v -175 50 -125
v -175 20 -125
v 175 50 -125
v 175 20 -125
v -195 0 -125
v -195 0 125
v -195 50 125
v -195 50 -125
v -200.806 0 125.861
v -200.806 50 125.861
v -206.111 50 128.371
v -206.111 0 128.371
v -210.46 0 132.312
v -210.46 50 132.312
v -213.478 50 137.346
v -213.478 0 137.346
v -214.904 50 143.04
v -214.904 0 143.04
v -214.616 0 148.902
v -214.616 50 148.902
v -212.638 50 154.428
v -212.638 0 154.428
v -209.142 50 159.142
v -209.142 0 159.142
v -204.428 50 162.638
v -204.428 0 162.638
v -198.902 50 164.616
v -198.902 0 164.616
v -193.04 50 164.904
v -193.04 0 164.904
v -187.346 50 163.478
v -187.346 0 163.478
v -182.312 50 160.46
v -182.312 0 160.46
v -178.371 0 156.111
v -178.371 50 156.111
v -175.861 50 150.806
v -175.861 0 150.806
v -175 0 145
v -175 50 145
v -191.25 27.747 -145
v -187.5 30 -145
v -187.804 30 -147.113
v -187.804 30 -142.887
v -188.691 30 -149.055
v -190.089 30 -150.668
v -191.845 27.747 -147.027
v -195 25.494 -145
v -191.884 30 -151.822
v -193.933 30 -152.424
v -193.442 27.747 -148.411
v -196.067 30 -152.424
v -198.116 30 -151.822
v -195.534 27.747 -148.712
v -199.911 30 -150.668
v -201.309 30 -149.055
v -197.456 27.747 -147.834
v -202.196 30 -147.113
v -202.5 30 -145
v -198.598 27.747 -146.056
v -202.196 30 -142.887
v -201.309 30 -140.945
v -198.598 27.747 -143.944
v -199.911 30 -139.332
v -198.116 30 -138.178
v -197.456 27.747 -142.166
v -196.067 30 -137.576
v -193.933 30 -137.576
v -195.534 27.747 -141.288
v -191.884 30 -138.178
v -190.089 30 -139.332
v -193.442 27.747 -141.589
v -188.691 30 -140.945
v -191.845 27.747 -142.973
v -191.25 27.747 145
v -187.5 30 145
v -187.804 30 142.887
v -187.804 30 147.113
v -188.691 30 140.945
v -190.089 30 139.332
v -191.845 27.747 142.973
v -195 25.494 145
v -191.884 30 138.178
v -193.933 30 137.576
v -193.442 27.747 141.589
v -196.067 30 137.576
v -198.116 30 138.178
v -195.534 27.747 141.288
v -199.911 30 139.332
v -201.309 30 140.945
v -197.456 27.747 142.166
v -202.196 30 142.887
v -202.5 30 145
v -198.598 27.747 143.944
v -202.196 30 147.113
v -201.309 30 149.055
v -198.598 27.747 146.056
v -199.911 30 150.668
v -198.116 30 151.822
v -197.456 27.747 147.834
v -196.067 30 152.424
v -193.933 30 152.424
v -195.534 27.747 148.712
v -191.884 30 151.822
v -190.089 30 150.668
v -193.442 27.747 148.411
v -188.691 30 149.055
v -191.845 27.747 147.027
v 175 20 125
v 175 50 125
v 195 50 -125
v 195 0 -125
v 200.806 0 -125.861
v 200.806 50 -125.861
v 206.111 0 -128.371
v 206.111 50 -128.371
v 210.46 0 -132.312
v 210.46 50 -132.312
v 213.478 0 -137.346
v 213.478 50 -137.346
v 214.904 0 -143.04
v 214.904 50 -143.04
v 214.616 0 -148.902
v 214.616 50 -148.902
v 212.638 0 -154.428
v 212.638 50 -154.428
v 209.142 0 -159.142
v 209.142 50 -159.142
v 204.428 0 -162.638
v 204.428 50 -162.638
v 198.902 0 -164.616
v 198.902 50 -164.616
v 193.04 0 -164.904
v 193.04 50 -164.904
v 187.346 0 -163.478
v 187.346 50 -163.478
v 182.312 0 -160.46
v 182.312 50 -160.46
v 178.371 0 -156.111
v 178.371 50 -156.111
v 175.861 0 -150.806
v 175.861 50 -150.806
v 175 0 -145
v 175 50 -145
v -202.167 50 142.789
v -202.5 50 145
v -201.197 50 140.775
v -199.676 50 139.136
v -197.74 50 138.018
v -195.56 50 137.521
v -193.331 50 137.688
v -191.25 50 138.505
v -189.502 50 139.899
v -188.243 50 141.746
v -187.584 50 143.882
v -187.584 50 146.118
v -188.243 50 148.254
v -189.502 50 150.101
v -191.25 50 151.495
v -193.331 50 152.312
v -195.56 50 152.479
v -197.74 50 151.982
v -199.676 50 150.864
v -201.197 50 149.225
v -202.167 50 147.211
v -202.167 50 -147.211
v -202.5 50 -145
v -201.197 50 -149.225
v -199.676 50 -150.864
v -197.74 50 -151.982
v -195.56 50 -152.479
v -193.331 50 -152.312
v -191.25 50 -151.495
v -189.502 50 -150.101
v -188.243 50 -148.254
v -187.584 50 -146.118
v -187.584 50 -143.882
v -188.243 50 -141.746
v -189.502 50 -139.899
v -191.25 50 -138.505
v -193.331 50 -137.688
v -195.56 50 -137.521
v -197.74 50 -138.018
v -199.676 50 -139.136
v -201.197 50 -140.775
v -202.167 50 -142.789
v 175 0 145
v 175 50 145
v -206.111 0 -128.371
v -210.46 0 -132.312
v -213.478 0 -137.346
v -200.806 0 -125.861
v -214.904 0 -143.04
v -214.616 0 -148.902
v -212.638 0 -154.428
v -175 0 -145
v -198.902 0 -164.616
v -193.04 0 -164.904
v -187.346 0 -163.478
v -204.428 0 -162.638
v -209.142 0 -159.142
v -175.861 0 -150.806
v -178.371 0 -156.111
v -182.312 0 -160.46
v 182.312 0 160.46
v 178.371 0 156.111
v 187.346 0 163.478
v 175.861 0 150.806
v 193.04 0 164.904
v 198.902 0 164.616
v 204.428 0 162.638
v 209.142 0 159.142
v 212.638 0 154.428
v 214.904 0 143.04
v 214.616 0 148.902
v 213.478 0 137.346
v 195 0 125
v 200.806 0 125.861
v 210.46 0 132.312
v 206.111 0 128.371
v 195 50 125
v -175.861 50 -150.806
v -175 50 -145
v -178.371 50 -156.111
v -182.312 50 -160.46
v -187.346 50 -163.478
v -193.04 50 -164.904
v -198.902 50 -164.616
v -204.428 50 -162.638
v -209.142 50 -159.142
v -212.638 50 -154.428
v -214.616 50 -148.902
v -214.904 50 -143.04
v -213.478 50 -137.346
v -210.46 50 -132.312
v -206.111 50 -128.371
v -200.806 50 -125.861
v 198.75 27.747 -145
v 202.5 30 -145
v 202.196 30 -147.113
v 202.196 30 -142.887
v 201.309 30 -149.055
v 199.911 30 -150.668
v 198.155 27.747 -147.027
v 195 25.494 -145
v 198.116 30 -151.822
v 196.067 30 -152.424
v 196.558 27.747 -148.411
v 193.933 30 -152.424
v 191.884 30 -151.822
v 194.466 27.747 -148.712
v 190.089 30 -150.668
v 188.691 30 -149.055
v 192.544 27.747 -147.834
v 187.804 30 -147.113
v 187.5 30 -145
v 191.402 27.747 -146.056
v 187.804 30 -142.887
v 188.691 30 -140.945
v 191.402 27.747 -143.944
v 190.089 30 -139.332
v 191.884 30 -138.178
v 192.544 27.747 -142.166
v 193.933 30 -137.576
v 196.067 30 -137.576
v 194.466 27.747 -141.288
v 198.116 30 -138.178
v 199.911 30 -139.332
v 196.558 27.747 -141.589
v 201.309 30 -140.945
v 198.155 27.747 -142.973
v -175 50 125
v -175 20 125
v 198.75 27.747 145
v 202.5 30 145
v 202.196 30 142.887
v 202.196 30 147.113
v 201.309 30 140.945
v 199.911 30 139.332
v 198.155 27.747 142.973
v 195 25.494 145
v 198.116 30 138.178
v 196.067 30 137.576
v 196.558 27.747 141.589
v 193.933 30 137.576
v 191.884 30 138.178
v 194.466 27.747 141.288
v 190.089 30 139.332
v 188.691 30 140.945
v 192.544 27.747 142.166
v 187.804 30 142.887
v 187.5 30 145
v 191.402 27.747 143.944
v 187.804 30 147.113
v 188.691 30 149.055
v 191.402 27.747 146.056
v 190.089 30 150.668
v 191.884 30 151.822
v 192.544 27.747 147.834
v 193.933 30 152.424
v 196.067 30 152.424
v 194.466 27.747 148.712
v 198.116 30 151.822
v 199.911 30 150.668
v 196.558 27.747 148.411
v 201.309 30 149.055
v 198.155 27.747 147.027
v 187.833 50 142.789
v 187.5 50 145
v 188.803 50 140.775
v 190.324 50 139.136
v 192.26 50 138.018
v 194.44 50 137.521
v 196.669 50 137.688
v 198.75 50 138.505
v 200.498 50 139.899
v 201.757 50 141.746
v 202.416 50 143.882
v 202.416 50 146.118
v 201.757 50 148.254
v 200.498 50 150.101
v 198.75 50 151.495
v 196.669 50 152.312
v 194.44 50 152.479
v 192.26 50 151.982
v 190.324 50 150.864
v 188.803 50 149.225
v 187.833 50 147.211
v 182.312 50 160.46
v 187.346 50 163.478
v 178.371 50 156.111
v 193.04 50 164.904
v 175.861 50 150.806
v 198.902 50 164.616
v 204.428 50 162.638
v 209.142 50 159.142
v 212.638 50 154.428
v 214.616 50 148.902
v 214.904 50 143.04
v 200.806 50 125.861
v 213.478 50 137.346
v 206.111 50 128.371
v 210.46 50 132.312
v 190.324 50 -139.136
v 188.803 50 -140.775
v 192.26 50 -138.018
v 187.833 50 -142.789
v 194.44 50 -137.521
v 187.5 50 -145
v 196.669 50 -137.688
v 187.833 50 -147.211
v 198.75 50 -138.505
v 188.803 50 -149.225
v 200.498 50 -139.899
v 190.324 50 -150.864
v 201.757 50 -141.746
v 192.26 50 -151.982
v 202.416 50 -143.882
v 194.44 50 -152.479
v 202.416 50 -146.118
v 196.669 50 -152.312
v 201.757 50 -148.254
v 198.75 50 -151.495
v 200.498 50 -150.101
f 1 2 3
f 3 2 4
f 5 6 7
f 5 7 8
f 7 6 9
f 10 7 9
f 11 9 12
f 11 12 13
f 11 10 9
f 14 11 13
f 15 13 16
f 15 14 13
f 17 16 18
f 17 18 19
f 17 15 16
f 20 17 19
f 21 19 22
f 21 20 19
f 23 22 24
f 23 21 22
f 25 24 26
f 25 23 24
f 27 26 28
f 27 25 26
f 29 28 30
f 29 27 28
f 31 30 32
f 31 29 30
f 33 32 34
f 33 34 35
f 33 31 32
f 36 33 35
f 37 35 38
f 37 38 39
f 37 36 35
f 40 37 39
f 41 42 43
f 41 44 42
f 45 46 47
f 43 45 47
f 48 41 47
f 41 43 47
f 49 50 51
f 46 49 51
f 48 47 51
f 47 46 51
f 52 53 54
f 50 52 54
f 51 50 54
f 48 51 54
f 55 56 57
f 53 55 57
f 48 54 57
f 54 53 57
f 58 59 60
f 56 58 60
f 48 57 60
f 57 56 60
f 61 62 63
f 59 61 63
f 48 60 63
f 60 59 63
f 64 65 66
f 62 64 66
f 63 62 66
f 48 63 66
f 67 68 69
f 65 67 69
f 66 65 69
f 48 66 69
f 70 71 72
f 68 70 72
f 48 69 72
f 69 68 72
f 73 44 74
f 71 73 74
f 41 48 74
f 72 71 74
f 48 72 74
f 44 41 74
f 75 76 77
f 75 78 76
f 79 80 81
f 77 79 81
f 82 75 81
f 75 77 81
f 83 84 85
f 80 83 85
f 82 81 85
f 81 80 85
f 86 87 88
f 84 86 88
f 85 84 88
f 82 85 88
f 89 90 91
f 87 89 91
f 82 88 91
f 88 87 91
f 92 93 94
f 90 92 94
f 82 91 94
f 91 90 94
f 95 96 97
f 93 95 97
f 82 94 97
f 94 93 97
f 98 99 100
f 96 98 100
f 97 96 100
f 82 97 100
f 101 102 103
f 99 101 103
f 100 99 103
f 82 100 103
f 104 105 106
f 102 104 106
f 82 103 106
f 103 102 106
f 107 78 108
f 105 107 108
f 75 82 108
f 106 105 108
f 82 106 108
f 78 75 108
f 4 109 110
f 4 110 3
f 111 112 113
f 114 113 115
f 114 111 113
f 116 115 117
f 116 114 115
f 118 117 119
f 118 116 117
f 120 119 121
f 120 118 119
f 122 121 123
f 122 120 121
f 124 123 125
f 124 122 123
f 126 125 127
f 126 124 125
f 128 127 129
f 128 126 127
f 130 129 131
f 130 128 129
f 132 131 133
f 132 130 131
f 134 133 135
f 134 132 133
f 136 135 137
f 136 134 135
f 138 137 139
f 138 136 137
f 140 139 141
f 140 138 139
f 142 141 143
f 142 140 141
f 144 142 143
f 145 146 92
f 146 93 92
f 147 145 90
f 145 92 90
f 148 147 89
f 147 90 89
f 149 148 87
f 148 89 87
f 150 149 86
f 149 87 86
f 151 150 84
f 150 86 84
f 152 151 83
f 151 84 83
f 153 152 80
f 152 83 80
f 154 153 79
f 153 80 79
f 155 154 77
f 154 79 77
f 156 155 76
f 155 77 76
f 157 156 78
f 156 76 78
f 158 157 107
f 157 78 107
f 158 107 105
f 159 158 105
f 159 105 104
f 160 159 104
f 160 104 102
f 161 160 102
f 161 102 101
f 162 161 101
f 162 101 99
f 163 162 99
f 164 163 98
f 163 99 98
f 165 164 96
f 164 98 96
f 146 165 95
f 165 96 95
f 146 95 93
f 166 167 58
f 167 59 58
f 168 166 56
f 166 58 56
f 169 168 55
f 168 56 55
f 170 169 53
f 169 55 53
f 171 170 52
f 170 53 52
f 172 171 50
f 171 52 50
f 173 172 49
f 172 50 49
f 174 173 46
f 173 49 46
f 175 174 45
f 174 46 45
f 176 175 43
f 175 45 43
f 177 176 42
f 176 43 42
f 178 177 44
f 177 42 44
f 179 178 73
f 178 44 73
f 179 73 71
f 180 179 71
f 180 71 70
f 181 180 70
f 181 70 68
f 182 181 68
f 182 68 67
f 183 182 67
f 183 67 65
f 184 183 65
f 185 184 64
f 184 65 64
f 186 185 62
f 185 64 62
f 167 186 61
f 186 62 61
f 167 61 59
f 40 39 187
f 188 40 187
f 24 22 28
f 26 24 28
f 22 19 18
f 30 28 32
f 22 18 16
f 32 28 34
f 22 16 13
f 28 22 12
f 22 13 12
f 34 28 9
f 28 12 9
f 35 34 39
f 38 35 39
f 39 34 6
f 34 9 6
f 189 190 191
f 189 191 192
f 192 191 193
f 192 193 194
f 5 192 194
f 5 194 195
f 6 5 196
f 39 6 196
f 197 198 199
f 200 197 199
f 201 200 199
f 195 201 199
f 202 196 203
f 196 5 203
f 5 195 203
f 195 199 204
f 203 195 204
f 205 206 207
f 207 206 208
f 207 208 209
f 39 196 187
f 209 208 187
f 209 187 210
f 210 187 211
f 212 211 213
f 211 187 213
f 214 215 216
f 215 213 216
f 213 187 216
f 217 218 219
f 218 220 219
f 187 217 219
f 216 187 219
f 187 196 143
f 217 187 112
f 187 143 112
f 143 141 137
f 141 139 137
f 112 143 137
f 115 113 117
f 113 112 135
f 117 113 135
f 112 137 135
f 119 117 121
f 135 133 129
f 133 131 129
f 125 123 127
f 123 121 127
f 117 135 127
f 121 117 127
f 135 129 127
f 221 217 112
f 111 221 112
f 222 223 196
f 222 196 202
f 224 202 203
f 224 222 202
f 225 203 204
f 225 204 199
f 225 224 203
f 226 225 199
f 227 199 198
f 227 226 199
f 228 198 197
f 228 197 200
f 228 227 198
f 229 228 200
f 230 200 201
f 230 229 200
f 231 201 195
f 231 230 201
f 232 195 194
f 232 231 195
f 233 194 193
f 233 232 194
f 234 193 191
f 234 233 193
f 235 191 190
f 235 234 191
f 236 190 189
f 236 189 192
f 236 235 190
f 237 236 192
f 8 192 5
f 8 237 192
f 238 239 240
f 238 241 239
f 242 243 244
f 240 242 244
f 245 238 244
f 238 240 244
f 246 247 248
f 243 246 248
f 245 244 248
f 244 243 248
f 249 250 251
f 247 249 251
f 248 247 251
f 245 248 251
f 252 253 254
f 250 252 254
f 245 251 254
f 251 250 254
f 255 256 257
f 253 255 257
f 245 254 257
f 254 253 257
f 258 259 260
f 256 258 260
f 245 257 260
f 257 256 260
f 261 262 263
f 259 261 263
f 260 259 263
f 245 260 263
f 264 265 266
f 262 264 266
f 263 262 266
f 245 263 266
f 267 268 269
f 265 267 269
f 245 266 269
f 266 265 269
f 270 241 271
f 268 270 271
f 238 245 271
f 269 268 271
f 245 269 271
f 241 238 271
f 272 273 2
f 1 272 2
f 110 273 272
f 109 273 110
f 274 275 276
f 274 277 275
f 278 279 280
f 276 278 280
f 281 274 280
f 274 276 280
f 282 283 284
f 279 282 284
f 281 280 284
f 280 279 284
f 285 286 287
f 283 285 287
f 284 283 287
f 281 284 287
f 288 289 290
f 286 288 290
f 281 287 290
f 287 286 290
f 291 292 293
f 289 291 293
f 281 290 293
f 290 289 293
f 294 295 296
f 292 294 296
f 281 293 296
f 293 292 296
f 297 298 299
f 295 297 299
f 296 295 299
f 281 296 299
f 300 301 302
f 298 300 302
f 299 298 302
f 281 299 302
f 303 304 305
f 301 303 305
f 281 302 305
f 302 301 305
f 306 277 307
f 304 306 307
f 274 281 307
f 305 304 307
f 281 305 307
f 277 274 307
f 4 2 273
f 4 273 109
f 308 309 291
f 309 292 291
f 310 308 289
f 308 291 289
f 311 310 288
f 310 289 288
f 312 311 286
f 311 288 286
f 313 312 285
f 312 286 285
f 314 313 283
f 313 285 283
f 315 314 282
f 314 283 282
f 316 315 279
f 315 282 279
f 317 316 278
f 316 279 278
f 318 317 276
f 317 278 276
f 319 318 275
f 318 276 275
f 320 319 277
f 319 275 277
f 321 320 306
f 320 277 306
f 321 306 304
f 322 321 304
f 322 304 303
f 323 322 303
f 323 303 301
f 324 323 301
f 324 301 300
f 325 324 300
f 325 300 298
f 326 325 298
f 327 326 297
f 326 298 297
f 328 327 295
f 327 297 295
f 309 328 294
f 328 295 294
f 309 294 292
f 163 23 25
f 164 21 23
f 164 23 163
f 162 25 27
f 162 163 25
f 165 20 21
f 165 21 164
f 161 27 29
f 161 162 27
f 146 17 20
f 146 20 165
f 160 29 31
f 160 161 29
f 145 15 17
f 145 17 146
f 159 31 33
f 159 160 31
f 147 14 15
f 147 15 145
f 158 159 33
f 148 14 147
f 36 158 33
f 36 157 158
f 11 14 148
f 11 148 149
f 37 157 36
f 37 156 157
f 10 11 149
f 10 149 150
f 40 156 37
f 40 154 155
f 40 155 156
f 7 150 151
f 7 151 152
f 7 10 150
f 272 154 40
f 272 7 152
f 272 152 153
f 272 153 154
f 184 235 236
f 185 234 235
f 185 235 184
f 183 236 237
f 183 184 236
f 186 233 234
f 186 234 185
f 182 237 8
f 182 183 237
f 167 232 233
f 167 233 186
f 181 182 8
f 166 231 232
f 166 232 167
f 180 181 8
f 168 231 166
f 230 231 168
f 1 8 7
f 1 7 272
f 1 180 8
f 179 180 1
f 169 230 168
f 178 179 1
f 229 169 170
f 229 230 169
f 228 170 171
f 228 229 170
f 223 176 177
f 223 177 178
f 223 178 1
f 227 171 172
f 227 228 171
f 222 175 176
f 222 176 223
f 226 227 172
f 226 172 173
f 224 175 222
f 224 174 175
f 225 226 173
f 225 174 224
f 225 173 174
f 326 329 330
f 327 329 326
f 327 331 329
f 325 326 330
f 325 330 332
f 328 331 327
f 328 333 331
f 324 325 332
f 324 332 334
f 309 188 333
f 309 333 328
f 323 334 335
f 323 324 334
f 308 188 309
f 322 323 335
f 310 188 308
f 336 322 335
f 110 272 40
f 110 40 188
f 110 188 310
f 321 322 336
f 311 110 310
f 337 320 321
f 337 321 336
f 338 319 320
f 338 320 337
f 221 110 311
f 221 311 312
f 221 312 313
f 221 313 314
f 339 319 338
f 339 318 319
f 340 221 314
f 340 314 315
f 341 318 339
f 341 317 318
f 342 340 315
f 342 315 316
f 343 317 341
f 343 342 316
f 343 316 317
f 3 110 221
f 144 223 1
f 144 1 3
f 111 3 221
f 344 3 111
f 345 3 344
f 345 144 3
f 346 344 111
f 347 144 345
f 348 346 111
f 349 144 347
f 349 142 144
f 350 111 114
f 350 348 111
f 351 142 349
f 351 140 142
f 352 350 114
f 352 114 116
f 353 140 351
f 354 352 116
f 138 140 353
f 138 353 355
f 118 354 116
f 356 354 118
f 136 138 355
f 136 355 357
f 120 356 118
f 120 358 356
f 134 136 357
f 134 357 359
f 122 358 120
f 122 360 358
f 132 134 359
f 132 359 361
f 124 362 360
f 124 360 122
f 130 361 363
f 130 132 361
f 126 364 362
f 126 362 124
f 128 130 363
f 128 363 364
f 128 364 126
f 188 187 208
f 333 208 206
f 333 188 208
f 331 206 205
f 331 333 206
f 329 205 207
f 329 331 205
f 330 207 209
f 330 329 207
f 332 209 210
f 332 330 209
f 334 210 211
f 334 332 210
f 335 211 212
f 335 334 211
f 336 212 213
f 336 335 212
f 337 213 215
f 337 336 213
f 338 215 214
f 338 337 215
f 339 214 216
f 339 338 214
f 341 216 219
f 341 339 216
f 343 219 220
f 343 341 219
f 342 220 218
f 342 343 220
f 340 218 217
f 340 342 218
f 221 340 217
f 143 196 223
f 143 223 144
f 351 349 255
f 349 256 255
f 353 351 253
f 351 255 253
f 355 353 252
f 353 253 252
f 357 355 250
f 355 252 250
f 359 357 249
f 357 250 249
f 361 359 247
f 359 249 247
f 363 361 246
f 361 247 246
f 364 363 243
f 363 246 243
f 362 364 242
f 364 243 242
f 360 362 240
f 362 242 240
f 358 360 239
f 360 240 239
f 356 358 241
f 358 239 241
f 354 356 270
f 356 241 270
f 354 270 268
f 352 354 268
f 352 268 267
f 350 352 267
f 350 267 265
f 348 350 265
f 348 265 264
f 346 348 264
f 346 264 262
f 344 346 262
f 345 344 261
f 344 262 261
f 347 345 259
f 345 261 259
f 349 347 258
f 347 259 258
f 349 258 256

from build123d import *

# Parameters (mm, degrees)
SKETCH2_W                      = 390
SKETCH2_H                      = 290
BOSS_EXTRUDE1_DEPTH            = 50
SHELL1_T                       = -20
SKETCH3_R                      = 20
BOSS_EXTRUDE2_DEPTH            = 50
F_15_0_15_DIAMETER_HOLE1_D     = 15
F_15_0_15_DIAMETER_HOLE1_DEPTH = 20
F_15_0_15_DIAMETER_HOLE1_TIP   = 4.506454643


with BuildPart() as part:
    # Sketch2 → Boss-Extrude1 (new body)
    with BuildSketch(Plane(origin=(0, 0, 0), x_dir=(1, 0, 0), z_dir=(0, 1, 0))):
        Rectangle(SKETCH2_W, SKETCH2_H)
    extrude(amount=BOSS_EXTRUDE1_DEPTH)

    # Shell1
    shell1_openings = [part.faces().sort_by_distance(p)[0] for p in [
        (0, 50, 0),
    ]]
    offset(amount=SHELL1_T, openings=shell1_openings, kind=Kind.INTERSECTION)

    # Sketch3 → Boss-Extrude2 (add)
    with BuildSketch(Plane(origin=(0, 50, 0), x_dir=(1, 0, 0), z_dir=(0, 1, 0))):
        with Locations((-195, 145)):
            Circle(SKETCH3_R)
        with Locations((195, 145)):
            Circle(SKETCH3_R)
        with Locations((195, -145)):
            Circle(SKETCH3_R)
        with Locations((-195, -145)):
            Circle(SKETCH3_R)
    extrude(amount=-BOSS_EXTRUDE2_DEPTH)

    # Ø15.0 (15) Diameter Hole1
    with Locations(Plane(origin=(0, 50, 0), x_dir=(1, 0, 0), z_dir=(0, 1, 0))):
        with Locations((-195, 145), (195, 145), (195, -145), (-195, -145)):
            Hole(F_15_0_15_DIAMETER_HOLE1_D / 2, depth=F_15_0_15_DIAMETER_HOLE1_DEPTH)
            with Locations((0, 0, -(F_15_0_15_DIAMETER_HOLE1_DEPTH + F_15_0_15_DIAMETER_HOLE1_TIP / 2))):  # 118° drill point
                Cone(0, F_15_0_15_DIAMETER_HOLE1_D / 2, F_15_0_15_DIAMETER_HOLE1_TIP, mode=Mode.SUBTRACT)


solid = part.part
